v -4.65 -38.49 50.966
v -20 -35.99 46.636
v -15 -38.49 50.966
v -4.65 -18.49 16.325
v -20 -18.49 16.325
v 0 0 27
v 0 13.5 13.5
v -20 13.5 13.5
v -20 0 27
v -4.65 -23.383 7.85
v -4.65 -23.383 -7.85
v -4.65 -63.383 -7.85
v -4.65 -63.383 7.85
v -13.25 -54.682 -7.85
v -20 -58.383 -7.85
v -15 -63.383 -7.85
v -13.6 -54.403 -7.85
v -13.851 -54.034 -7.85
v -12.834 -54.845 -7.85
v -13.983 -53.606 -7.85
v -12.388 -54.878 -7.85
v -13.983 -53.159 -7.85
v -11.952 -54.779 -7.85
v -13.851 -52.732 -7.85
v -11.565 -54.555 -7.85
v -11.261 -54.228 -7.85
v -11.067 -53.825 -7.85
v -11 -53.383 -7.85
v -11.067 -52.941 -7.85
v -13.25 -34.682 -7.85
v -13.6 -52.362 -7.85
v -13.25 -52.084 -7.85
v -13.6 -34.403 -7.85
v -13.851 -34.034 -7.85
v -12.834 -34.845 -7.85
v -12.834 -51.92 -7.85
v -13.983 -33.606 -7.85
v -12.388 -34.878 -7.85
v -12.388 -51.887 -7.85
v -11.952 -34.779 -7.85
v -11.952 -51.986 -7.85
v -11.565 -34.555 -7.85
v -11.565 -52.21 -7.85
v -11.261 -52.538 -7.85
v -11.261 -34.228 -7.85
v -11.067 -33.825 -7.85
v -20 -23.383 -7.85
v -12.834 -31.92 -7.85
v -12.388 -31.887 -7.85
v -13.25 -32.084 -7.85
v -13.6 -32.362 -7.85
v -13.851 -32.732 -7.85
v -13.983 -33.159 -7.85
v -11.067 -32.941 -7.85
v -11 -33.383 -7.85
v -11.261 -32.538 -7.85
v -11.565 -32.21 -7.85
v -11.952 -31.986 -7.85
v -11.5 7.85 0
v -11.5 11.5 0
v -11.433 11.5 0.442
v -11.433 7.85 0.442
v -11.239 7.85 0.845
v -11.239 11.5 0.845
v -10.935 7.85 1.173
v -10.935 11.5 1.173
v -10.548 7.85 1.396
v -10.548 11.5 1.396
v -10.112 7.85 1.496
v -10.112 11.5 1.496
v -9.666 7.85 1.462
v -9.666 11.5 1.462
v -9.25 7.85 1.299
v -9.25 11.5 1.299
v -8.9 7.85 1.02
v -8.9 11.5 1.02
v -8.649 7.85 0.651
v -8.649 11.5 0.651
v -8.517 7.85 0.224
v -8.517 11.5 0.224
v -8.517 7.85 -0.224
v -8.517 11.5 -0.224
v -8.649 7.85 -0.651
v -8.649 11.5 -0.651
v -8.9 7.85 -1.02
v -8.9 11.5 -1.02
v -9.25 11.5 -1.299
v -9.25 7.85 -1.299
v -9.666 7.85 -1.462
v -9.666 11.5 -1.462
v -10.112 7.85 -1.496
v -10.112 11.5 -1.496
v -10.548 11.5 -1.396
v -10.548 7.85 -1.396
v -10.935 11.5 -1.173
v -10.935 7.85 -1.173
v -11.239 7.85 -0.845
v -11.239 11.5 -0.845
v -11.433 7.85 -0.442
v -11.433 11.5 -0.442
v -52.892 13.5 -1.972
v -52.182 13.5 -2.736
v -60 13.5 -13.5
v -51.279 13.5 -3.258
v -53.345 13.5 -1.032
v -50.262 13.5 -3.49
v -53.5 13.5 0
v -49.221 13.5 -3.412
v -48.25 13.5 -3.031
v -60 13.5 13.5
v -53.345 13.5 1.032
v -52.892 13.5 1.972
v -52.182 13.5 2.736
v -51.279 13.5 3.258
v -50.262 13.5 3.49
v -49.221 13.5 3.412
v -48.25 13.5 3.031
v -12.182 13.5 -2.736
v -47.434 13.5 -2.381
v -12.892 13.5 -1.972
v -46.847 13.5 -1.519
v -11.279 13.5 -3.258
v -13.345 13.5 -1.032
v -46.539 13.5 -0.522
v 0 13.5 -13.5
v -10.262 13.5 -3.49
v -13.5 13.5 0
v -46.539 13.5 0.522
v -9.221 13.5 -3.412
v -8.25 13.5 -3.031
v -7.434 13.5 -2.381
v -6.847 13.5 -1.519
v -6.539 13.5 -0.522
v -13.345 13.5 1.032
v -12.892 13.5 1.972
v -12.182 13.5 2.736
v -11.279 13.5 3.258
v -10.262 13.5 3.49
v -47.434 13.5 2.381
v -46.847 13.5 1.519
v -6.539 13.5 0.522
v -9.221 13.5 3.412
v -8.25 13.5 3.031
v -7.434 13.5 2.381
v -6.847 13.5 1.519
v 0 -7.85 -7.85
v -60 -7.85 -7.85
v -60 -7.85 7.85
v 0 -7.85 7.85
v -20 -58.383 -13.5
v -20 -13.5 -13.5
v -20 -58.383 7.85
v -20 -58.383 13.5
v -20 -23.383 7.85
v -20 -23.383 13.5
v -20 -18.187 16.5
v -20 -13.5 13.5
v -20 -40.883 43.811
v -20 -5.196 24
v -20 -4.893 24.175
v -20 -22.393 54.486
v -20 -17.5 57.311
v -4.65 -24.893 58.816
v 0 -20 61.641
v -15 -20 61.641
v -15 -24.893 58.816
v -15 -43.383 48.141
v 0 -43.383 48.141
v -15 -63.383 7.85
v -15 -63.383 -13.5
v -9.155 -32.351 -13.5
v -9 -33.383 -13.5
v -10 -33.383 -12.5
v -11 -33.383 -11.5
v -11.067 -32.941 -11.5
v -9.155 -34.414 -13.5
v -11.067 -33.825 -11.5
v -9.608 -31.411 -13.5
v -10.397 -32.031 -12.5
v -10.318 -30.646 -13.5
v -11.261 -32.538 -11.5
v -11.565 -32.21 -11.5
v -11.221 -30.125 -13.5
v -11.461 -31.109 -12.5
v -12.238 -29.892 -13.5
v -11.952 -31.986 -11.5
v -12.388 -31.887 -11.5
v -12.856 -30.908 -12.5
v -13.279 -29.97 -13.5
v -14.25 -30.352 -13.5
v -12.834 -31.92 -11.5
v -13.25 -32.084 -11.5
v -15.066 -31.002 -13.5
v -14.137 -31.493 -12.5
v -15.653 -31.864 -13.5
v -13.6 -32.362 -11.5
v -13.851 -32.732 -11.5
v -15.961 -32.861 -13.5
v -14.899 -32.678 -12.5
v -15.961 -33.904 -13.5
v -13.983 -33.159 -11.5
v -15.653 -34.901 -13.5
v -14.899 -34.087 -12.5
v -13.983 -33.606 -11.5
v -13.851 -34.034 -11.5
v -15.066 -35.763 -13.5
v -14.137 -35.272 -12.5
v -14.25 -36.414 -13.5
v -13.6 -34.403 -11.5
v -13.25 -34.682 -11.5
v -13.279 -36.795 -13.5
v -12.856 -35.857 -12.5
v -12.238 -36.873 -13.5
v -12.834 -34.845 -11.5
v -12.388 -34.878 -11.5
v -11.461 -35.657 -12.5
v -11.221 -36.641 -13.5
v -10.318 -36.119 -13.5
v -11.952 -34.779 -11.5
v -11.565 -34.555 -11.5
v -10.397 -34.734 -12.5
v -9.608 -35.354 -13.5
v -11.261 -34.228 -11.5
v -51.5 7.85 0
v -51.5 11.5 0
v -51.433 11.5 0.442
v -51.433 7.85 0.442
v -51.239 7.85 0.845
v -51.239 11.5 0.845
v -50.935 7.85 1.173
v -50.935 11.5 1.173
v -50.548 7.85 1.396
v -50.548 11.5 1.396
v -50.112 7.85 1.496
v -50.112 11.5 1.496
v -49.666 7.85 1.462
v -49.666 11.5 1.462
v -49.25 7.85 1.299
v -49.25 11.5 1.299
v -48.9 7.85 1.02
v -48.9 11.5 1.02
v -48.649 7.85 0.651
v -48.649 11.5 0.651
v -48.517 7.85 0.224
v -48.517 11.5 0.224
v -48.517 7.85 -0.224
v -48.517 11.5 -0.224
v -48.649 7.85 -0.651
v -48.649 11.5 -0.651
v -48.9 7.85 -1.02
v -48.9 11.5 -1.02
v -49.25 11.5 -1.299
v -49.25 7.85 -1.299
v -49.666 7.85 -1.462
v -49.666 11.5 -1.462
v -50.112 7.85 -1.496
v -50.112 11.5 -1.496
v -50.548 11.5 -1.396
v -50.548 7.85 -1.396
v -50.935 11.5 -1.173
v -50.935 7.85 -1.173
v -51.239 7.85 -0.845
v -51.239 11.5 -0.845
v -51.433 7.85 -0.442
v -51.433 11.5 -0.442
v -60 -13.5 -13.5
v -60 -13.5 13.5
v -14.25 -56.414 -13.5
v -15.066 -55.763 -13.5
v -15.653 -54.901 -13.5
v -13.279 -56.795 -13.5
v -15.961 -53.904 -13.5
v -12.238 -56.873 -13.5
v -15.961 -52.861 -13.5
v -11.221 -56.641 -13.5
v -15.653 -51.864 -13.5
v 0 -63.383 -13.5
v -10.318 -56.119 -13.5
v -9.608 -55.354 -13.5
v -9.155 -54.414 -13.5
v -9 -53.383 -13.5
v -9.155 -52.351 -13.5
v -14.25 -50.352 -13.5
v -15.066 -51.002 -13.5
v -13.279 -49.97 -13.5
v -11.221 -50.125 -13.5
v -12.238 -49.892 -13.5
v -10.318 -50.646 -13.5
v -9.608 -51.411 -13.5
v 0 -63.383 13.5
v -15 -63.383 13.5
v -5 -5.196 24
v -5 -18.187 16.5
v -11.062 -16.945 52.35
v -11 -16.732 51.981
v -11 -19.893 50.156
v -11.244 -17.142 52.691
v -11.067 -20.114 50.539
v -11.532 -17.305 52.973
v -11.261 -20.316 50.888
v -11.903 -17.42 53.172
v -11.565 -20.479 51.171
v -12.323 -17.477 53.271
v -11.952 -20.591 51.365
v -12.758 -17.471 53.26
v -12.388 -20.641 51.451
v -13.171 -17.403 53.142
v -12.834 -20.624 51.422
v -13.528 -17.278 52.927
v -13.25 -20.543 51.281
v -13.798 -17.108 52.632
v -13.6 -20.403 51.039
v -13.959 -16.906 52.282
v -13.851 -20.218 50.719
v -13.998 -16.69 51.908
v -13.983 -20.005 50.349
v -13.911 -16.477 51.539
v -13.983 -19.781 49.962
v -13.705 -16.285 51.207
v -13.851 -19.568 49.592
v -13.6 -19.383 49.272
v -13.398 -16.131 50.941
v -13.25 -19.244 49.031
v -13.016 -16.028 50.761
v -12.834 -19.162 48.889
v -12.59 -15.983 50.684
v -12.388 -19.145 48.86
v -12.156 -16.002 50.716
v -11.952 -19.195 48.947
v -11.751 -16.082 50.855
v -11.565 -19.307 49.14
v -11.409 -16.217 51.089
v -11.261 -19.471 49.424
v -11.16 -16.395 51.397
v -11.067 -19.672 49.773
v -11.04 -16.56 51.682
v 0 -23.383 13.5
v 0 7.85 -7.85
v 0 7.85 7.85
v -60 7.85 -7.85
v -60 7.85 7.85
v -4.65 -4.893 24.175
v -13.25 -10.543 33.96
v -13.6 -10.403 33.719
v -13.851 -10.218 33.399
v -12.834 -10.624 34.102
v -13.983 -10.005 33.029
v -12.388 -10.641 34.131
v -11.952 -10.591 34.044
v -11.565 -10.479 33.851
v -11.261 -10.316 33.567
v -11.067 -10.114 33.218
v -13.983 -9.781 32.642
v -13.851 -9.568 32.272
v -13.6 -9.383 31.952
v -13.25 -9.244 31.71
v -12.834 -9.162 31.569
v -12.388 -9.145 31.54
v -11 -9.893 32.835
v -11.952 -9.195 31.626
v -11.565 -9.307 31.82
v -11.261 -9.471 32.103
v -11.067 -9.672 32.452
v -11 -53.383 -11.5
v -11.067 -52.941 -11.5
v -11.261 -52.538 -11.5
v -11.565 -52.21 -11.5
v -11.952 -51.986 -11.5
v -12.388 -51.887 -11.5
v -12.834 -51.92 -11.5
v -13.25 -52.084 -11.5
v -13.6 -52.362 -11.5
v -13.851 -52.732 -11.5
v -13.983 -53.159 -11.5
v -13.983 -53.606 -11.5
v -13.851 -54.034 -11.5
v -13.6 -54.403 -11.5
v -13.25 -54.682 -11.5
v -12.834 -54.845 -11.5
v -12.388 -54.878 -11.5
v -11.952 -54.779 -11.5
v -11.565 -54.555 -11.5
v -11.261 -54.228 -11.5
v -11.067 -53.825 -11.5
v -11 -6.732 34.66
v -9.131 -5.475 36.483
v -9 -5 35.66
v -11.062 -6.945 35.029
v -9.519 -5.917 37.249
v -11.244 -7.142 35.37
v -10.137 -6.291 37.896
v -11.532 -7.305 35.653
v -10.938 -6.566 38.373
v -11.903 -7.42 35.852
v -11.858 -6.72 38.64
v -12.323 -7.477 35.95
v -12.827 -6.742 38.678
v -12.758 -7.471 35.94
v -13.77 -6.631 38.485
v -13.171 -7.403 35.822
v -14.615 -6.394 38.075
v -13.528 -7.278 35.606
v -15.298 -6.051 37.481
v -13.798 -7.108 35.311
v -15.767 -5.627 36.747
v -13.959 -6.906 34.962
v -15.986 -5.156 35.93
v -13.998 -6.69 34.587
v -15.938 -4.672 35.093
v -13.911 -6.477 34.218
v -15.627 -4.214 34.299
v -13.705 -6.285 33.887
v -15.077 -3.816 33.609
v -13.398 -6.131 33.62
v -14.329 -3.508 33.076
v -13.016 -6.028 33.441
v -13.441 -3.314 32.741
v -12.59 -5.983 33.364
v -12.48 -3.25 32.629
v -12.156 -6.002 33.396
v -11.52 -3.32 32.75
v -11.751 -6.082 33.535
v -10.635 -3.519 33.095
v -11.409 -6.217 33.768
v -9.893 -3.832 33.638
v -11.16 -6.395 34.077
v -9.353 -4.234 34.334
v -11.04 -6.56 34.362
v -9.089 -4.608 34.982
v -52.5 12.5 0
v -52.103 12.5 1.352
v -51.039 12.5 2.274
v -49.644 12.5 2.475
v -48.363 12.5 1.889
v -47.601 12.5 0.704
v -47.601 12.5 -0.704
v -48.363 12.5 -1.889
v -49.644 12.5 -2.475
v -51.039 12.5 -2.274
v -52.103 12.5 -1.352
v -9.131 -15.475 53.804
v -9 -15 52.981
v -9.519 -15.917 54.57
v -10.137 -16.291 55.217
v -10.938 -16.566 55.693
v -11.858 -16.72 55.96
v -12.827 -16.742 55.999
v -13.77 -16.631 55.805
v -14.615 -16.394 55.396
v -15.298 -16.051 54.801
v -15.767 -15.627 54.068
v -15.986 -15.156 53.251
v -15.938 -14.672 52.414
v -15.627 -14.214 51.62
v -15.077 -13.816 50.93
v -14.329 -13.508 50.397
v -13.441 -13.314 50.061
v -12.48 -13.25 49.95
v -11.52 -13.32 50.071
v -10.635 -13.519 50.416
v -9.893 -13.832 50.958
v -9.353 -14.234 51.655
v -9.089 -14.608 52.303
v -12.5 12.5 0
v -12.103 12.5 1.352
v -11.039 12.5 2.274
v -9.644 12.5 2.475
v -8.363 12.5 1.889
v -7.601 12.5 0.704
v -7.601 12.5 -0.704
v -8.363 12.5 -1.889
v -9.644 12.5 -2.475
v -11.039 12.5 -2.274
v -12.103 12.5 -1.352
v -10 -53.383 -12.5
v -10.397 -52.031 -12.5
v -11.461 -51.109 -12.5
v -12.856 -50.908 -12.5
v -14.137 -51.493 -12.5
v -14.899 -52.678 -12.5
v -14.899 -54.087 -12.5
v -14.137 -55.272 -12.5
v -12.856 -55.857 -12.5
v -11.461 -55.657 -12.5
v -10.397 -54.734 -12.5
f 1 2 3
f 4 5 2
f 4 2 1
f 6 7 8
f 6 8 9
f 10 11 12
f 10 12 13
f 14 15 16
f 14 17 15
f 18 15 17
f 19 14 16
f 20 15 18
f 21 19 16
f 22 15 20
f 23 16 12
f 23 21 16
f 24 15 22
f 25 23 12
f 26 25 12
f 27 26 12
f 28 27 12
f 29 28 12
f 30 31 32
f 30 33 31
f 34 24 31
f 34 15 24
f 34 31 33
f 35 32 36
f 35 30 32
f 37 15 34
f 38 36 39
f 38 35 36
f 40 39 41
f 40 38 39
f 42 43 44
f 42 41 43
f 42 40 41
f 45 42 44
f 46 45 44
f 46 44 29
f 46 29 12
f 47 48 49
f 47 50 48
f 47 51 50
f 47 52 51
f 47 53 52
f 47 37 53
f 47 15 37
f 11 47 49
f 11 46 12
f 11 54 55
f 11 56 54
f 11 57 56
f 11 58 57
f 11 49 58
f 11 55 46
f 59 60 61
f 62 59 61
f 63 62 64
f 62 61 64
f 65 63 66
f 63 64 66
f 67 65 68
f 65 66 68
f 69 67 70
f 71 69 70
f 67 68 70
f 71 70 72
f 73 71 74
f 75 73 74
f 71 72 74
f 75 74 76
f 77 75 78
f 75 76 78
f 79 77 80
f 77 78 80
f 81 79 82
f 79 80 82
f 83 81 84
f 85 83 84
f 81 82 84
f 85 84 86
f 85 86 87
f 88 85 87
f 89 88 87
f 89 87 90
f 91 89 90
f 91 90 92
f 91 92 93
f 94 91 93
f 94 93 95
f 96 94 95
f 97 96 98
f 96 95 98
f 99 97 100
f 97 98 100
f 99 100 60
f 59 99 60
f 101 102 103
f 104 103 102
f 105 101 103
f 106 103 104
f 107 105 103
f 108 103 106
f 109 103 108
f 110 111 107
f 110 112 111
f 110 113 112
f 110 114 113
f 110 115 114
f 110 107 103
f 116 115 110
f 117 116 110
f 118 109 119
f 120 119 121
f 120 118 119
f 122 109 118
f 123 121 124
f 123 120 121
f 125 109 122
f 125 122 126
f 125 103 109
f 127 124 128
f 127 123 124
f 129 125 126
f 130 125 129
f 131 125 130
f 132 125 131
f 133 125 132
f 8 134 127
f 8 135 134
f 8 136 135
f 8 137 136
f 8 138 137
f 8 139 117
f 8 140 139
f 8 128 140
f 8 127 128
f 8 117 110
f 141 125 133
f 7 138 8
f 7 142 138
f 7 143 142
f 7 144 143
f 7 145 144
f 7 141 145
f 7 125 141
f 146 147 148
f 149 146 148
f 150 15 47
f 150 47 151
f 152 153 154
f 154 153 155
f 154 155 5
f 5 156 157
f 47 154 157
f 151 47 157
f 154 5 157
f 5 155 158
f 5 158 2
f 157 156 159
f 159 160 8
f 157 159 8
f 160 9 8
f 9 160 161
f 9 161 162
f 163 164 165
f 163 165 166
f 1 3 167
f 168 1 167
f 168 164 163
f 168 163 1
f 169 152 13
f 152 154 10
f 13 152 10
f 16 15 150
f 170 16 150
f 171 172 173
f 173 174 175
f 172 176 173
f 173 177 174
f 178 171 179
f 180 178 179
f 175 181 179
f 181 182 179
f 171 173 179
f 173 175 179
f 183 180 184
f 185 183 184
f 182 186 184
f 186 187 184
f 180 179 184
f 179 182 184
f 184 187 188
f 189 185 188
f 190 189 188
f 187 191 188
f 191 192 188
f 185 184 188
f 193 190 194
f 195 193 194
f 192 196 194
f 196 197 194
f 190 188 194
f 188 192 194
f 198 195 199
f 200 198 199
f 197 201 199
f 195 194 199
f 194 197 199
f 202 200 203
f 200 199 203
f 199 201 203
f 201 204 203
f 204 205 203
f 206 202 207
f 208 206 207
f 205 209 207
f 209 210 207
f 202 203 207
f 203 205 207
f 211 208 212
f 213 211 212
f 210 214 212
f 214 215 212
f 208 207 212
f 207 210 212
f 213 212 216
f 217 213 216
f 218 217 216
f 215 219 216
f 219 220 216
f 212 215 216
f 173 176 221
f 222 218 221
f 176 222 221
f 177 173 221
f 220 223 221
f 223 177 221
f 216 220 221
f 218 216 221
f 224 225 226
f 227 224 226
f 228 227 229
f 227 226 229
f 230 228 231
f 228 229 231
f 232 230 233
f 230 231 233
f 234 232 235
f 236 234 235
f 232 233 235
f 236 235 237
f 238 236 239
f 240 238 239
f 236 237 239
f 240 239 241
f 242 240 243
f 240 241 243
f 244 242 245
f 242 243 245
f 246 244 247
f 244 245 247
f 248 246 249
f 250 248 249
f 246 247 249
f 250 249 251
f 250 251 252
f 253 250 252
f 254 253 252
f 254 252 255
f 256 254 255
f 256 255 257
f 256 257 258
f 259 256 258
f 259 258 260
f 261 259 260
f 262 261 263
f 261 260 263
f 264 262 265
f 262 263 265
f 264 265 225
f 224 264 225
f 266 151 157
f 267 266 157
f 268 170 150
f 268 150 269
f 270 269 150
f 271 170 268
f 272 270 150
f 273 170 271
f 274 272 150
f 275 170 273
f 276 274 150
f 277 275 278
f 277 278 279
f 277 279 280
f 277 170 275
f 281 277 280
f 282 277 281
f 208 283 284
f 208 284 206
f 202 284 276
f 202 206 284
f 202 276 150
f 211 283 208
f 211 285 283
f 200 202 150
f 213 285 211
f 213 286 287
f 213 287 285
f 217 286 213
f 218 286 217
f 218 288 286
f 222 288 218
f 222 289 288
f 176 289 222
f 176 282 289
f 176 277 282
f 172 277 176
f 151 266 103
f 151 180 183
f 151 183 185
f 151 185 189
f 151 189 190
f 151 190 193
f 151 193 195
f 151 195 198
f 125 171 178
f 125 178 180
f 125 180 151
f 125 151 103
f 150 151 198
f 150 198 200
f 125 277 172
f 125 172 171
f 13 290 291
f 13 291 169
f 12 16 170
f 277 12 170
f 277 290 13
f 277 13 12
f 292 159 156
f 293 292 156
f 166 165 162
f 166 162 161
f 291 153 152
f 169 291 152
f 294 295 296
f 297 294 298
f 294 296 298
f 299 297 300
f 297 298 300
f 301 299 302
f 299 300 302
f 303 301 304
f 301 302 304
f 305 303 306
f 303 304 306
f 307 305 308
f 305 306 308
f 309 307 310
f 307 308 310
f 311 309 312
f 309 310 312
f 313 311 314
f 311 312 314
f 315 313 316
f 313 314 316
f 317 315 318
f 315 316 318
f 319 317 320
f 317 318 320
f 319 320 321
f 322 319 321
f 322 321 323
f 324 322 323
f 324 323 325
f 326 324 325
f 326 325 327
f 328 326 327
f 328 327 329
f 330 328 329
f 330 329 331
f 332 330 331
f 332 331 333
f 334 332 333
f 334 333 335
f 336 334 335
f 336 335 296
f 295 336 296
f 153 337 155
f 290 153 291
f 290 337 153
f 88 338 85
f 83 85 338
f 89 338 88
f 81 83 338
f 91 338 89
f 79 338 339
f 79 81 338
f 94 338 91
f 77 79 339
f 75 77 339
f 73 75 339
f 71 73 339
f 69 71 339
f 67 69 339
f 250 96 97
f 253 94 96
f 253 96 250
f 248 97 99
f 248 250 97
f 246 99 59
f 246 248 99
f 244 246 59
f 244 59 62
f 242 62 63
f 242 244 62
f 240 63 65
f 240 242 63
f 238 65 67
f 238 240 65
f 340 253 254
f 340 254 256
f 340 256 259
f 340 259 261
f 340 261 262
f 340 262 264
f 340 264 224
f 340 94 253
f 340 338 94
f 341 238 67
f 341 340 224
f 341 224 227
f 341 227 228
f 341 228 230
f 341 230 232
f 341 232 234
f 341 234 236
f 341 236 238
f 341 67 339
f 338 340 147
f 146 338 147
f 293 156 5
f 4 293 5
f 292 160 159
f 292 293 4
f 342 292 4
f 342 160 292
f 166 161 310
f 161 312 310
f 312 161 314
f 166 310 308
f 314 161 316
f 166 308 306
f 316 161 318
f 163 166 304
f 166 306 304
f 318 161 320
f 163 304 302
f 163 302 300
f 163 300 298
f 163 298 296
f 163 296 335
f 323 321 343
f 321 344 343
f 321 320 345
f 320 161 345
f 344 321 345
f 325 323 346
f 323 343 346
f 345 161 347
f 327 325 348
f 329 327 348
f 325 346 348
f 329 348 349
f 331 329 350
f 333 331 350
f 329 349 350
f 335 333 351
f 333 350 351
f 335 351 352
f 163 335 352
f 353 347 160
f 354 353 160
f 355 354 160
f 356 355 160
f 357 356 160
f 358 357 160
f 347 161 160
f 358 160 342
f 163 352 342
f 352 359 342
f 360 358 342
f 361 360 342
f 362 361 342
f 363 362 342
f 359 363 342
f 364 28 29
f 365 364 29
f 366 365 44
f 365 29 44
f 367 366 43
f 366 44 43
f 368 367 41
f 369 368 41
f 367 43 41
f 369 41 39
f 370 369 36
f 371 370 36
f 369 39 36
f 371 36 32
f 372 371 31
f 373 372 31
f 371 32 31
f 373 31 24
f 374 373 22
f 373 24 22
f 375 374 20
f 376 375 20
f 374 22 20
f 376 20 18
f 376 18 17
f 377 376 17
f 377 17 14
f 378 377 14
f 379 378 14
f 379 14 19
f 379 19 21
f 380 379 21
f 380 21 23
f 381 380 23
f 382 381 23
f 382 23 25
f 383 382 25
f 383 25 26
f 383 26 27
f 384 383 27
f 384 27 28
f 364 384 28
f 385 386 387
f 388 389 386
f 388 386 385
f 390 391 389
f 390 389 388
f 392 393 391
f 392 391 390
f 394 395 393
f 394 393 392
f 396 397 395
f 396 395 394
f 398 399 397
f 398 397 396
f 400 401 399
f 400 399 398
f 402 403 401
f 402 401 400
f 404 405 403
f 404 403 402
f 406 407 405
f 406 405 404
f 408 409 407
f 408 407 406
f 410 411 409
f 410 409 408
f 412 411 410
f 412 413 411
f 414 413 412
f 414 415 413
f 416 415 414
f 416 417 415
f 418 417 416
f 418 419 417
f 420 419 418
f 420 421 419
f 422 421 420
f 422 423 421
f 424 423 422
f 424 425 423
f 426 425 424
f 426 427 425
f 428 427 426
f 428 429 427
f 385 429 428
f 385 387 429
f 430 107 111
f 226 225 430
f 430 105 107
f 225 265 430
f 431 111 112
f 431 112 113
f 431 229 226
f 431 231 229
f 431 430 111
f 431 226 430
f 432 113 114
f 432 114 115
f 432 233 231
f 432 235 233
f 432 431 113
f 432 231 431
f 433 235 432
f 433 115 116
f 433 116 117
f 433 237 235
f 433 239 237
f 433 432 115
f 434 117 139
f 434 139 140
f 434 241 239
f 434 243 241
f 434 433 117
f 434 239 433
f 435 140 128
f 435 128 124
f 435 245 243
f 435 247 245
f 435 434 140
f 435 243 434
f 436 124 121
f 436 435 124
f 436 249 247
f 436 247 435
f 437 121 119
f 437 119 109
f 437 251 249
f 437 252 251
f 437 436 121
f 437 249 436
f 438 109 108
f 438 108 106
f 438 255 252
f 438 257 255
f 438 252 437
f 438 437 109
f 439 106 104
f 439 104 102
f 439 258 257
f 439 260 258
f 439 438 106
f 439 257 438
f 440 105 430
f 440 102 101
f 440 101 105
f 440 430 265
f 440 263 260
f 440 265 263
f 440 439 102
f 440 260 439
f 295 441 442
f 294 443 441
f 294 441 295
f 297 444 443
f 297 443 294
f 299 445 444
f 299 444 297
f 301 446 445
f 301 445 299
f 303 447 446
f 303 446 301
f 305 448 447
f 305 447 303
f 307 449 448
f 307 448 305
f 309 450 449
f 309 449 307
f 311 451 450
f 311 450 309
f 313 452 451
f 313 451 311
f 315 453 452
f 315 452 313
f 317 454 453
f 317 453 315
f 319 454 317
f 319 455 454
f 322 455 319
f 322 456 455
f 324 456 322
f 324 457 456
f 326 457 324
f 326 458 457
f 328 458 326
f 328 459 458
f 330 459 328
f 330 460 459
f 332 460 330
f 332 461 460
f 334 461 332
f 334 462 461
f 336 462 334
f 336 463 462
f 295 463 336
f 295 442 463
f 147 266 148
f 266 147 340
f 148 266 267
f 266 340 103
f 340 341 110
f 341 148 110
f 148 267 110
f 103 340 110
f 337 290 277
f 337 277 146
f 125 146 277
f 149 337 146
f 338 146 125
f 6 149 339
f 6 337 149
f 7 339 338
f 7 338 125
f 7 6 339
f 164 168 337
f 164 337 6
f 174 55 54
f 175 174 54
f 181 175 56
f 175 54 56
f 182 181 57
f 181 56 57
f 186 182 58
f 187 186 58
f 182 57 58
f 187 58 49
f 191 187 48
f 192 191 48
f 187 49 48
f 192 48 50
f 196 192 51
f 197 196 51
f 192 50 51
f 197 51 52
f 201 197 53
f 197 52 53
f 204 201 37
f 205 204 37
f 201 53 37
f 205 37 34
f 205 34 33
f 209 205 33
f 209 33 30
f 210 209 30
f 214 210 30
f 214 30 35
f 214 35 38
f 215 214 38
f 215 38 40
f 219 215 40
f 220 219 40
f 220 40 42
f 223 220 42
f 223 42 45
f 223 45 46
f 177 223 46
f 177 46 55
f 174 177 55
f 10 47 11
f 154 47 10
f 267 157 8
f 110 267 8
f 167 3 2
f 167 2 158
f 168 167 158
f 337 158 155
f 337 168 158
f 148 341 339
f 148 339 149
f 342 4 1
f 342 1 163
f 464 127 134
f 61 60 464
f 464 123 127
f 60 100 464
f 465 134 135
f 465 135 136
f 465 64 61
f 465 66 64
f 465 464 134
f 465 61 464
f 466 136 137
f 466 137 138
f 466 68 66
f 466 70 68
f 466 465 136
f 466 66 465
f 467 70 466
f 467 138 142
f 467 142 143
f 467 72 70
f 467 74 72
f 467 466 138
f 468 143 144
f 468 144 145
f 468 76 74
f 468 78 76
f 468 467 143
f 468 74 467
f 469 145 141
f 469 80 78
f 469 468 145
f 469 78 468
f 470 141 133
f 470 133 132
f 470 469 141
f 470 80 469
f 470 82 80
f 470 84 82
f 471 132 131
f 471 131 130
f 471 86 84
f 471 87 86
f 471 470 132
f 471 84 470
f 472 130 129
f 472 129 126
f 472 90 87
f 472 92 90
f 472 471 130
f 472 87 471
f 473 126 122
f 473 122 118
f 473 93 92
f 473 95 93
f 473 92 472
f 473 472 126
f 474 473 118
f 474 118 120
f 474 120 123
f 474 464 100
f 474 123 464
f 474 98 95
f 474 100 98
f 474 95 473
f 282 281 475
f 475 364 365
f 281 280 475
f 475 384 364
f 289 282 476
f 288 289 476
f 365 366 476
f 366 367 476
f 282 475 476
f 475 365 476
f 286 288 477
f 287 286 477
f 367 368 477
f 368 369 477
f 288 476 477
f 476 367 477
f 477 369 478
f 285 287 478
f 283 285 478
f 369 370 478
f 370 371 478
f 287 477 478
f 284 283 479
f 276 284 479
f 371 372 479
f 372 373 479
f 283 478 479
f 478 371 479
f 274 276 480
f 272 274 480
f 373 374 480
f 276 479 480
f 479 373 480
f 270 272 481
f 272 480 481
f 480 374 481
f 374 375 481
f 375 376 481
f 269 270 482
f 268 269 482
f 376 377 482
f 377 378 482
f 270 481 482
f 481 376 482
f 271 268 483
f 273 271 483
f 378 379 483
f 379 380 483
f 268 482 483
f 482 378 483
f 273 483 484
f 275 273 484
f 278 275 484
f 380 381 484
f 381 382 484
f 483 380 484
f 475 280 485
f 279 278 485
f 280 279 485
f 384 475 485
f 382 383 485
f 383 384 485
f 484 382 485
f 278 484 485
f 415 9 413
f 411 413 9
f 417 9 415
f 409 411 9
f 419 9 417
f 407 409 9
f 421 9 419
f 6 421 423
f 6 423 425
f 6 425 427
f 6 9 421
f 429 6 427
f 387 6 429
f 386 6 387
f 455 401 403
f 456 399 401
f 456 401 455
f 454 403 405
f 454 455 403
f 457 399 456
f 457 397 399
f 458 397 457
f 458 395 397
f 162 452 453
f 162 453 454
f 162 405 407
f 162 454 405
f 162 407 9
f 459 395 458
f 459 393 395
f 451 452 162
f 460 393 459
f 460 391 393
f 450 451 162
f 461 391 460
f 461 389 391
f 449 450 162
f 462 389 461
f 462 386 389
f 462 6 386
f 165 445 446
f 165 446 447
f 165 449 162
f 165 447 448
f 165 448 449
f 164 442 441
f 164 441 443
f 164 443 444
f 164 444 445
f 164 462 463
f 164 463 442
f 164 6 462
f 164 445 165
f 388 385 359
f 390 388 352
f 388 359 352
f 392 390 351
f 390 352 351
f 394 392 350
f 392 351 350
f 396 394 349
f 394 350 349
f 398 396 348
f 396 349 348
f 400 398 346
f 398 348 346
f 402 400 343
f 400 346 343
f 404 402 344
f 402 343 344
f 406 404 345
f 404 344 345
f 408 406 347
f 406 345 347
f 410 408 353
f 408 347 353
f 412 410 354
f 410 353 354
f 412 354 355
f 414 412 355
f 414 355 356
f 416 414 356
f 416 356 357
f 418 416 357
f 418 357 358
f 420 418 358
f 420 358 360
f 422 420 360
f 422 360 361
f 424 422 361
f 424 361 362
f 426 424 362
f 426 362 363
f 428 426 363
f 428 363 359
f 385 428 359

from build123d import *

# Parameters (mm, degrees)
F0_W      = 15
F0_H      = 15
F1_DEPTH  = 20
F2_W      = 40
F2_H      = 15
F3_DEPTH  = 15
F4_W      = 27
F4_H      = 27
F4_W_2    = 15
F4_H_2    = 15
F5_DEPTH  = 60
F6_W      = 15.7
F6_H      = 15.7
F7_DEPTH  = 60.001
F8_W      = 15.7
F8_H      = 15.7
F9_DEPTH  = 40.001
F10_W     = 15.7
F10_H     = 15.7
F11_DEPTH = 61.6923429511
F12_R     = 1.5
F13_DEPTH = 5.65
F14_R     = 1.5
F15_DEPTH = 34.6628510268
F16_R     = 1.5
F17_DEPTH = 5.651
F18_SIZE  = 5
F19_SIZE  = 2
F21_DEPTH = 20


with BuildPart() as f1:
    # F0 (on Right) → F1 (new body)
    with BuildSketch(Plane.YZ):
        Polygon((-63.3826859022, -13.5), (13.5, -13.5), (13.5, 3.6173140978), (-20, 61.6410161514), (-43.3826859022, 48.1410161514), (-23.3826859022, 13.5), (-63.3826859022, 13.5), align=None)
        Rectangle(F0_W, F0_H, mode=Mode.SUBTRACT)
    extrude(amount=-F1_DEPTH)

    # F2 (on face) → F3 (cut)
    with BuildSketch(Plane(origin=(-20, 0, 0), x_dir=(0, -1, 0), z_dir=(-1, 0, 0))):
        Polygon((5.1961524227, 24), (18.1865334795, 16.5), (38.1865334795, 51.1410161514), (25.1961524227, 58.6410161514), align=None)
        with Locations((43.3826859022, 0)):
            Rectangle(F2_W, F2_H)
    extrude(amount=-F3_DEPTH, mode=Mode.SUBTRACT)

    # F4 (on face) → F5 (join)
    with BuildSketch(Plane.YZ):
        Rectangle(F4_W, F4_H)
        Rectangle(F4_W_2, F4_H_2, mode=Mode.SUBTRACT)
    extrude(amount=-F5_DEPTH)

    # F6 (on face) → F7 (cut, through all)
    with BuildSketch(Plane(origin=(-60, 0, 0), x_dir=(0, -1, 0), z_dir=(-1, 0, 0))):
        Rectangle(F6_W, F6_H)
    extrude(amount=-F7_DEPTH, mode=Mode.SUBTRACT)

    # F8 (on face) → F9 (cut, through all)
    with BuildSketch(Plane.XZ.offset(23.3826859022)):
        with Locations((-12.5, 0)):
            Rectangle(F8_W, F8_H)
    extrude(amount=F9_DEPTH, mode=Mode.SUBTRACT)

    # F10 (on face) → F11 (cut, through all)
    with BuildSketch(Plane(origin=(0, -11.6913429511, 20.25), x_dir=(1, 0, 0), z_dir=(0, -0.5, 0.8660254038))):
        with Locations((-12.5, 0)):
            Rectangle(F10_W, F10_H)
    extrude(amount=F11_DEPTH, mode=Mode.SUBTRACT)

    # F12 (on face) → F13 (cut, through all)
    with BuildSketch(Plane(origin=(0, 13.5, 0), x_dir=(-1, 0, 0), z_dir=(0, 1, 0))):
        with Locations((10, 0)):
            Circle(F12_R)
        with Locations((50, 0)):
            Circle(F12_R)
    extrude(amount=-F13_DEPTH, mode=Mode.SUBTRACT)

    # F14 (on face) → F15 (cut, through all)
    with BuildSketch(Plane(origin=(0, 6.7982994197, 3.925), x_dir=(1, 0, 0), z_dir=(0, -0.8660254038, -0.5))):
        with Locations((-12.5, 33.3826859022)):
            Circle(F14_R)
        with Locations((-12.5, 53.3826859022)):
            Circle(F14_R)
    extrude(amount=-F15_DEPTH, mode=Mode.SUBTRACT)

    # F16 (on face) → F17 (cut, through all)
    with BuildSketch(Plane.XY.offset(-7.85)):
        with Locations((-12.5, -53.3826859022)):
            Circle(F16_R)
        with Locations((-12.5, -33.3826859022)):
            Circle(F16_R)
    extrude(amount=-F17_DEPTH, mode=Mode.SUBTRACT)

    # F18
    f18_edges = [f1.edges().sort_by_distance(p)[0] for p in [
        (-20, -40.936164, 49.553516),
        (-20, -22.446522, 60.228516),
        (-20, -63.382686, 10.675),
        (-20, -63.382686, -10.675),
    ]]
    chamfer(f18_edges, length=F18_SIZE)

    # F19
    f19_edges = [f1.edges().sort_by_distance(p)[0] for p in [
        (-14, -15, 52.980762),
        (-14, -5, 35.660254),
        (-8.5, 13.5, 0),
        (-48.5, 13.5, 0),
        (-14, -33.382686, -13.5),
        (-14, -53.382686, -13.5),
    ]]
    chamfer(f19_edges, length=F19_SIZE)

    # F20 (on face) → F21 (join, through all)
    with BuildSketch(Plane.YZ):
        Polygon((7.7942286341, 13.5), (13.5, 13.5), (0, 27), align=None)
    extrude(amount=-F21_DEPTH)


solid = f1.part
